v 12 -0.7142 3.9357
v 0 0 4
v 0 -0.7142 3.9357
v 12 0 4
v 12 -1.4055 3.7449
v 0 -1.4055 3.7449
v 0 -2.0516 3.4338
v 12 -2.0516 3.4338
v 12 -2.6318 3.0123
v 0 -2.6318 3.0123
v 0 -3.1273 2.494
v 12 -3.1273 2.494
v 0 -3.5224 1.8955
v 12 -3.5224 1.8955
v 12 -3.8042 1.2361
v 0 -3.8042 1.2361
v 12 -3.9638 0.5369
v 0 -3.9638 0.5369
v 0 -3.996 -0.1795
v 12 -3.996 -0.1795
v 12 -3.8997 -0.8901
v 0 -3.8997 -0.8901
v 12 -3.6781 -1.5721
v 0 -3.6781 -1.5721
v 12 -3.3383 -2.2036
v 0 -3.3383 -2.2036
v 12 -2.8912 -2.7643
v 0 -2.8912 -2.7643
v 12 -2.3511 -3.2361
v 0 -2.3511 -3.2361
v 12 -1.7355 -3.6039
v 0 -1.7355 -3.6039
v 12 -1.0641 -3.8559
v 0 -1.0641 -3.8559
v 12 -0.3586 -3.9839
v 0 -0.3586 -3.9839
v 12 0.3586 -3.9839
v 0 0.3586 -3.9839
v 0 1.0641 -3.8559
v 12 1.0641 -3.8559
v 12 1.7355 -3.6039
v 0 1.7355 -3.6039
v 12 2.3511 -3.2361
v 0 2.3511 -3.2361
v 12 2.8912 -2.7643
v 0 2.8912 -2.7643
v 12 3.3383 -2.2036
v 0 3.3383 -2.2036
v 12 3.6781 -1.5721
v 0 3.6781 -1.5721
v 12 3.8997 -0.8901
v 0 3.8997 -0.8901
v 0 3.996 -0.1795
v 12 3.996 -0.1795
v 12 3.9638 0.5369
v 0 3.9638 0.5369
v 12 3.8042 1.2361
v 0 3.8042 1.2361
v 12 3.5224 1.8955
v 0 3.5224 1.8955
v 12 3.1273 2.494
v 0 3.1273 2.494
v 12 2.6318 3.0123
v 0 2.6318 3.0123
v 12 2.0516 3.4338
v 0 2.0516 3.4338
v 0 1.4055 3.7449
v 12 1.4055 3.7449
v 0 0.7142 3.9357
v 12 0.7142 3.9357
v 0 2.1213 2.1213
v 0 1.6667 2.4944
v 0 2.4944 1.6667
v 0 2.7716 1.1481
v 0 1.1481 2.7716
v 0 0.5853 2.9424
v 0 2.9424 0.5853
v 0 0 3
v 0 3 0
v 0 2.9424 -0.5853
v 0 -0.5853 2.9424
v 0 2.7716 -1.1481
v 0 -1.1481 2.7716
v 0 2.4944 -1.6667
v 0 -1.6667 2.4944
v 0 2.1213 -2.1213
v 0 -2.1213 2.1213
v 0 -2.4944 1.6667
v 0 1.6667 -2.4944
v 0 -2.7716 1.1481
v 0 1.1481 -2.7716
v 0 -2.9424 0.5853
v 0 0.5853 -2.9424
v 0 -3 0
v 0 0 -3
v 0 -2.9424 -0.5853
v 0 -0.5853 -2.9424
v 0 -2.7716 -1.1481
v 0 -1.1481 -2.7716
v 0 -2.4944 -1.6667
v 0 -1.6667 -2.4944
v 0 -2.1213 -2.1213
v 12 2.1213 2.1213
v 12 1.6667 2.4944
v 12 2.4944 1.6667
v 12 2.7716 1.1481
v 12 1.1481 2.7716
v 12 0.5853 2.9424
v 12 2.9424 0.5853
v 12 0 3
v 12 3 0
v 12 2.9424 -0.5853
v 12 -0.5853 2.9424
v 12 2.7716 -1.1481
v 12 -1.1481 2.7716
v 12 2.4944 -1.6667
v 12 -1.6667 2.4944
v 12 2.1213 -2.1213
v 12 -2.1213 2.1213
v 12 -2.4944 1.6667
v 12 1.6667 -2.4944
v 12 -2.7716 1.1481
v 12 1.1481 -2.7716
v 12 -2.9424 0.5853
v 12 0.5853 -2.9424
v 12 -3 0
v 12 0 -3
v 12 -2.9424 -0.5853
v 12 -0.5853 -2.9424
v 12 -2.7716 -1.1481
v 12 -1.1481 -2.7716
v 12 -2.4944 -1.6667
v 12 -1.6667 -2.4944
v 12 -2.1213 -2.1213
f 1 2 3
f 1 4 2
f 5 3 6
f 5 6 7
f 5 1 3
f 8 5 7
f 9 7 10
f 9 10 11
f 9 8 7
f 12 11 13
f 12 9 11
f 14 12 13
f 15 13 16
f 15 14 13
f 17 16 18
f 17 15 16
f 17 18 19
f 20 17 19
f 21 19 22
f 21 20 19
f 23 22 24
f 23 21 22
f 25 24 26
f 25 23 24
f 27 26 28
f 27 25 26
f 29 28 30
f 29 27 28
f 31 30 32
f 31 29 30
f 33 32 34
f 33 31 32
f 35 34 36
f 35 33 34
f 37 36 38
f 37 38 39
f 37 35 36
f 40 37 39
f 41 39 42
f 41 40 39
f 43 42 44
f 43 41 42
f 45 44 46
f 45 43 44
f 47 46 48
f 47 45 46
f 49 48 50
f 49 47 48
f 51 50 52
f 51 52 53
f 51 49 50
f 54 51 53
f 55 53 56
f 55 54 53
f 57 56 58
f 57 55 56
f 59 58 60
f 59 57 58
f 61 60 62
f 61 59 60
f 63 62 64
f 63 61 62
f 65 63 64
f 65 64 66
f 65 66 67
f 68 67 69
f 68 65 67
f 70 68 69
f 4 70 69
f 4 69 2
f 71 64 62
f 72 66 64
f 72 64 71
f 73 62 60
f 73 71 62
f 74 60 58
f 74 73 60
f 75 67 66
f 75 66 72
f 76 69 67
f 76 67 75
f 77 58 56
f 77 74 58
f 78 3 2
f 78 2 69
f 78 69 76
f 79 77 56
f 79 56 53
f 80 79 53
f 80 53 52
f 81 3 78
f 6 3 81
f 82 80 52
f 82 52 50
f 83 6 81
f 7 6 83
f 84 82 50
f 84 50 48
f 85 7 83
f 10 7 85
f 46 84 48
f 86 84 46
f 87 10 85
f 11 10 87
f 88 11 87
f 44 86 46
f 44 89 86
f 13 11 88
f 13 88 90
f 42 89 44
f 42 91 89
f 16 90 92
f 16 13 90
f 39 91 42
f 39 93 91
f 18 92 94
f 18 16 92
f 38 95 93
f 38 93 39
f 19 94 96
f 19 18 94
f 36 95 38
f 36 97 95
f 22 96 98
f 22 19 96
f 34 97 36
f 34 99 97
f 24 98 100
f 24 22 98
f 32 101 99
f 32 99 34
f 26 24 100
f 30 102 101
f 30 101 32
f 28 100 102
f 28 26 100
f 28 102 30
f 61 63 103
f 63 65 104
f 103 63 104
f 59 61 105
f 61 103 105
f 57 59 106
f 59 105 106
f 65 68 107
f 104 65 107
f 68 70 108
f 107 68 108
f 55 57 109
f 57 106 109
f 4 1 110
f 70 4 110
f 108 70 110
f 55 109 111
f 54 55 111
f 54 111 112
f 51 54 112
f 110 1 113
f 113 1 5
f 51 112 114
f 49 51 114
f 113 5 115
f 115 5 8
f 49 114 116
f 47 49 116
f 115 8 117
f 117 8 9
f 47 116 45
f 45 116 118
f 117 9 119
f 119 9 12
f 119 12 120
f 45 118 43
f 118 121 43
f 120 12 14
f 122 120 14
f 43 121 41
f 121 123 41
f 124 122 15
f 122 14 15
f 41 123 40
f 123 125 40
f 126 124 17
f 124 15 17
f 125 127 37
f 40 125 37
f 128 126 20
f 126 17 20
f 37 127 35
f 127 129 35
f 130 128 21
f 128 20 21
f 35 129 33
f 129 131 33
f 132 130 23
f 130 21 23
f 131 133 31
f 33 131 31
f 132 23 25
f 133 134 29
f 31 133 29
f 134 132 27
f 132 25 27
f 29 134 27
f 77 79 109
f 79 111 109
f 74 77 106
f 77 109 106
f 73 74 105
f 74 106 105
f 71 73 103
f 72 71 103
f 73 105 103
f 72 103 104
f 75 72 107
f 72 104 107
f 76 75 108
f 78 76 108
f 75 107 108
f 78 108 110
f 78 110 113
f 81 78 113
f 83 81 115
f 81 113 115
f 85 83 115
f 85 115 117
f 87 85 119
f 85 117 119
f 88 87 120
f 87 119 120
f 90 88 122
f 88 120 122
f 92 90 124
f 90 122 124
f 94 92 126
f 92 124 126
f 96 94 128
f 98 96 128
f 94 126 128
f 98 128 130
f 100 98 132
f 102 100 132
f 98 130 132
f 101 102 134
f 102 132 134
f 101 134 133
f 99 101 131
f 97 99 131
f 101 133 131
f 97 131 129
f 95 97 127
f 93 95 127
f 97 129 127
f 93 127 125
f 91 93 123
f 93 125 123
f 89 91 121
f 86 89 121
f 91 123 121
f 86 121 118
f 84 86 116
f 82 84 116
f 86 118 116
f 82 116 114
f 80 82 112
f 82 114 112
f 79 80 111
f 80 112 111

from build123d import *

# Parameters (mm, degrees)
SKETCH1_W = 12
SKETCH1_H = 4


with BuildPart() as part:
    # Sketch1 → Revolve1 (revolve)
    with BuildSketch(Plane.XY, mode=Mode.PRIVATE) as revolve1_sk:
        with Locations((6, 2)):
            Rectangle(SKETCH1_W, SKETCH1_H)
    revolve(revolve1_sk.sketch.rotate(Axis((0, 0, 0), (1, 0, 0)), 90), axis=Axis((0, 0, 0), (1, 0, 0)))

    # SurfaceCut1: cut with a surface, the side it looks to stays
    # Surface-Revolve1: a surface, the sketch's curves turned about an axis
    with BuildLine(Plane.XY, mode=Mode.PRIVATE) as surface_revolve1_1_path:
        Line((0, 3), (12, 3))
    surface_revolve1_1 = Shell.revolve(surface_revolve1_1_path.wire(), 360, Axis((0, 0, 0), (1, 0, 0)))
    split(bisect_by=surface_revolve1_1, keep=Keep.TOP)


solid = part.part
